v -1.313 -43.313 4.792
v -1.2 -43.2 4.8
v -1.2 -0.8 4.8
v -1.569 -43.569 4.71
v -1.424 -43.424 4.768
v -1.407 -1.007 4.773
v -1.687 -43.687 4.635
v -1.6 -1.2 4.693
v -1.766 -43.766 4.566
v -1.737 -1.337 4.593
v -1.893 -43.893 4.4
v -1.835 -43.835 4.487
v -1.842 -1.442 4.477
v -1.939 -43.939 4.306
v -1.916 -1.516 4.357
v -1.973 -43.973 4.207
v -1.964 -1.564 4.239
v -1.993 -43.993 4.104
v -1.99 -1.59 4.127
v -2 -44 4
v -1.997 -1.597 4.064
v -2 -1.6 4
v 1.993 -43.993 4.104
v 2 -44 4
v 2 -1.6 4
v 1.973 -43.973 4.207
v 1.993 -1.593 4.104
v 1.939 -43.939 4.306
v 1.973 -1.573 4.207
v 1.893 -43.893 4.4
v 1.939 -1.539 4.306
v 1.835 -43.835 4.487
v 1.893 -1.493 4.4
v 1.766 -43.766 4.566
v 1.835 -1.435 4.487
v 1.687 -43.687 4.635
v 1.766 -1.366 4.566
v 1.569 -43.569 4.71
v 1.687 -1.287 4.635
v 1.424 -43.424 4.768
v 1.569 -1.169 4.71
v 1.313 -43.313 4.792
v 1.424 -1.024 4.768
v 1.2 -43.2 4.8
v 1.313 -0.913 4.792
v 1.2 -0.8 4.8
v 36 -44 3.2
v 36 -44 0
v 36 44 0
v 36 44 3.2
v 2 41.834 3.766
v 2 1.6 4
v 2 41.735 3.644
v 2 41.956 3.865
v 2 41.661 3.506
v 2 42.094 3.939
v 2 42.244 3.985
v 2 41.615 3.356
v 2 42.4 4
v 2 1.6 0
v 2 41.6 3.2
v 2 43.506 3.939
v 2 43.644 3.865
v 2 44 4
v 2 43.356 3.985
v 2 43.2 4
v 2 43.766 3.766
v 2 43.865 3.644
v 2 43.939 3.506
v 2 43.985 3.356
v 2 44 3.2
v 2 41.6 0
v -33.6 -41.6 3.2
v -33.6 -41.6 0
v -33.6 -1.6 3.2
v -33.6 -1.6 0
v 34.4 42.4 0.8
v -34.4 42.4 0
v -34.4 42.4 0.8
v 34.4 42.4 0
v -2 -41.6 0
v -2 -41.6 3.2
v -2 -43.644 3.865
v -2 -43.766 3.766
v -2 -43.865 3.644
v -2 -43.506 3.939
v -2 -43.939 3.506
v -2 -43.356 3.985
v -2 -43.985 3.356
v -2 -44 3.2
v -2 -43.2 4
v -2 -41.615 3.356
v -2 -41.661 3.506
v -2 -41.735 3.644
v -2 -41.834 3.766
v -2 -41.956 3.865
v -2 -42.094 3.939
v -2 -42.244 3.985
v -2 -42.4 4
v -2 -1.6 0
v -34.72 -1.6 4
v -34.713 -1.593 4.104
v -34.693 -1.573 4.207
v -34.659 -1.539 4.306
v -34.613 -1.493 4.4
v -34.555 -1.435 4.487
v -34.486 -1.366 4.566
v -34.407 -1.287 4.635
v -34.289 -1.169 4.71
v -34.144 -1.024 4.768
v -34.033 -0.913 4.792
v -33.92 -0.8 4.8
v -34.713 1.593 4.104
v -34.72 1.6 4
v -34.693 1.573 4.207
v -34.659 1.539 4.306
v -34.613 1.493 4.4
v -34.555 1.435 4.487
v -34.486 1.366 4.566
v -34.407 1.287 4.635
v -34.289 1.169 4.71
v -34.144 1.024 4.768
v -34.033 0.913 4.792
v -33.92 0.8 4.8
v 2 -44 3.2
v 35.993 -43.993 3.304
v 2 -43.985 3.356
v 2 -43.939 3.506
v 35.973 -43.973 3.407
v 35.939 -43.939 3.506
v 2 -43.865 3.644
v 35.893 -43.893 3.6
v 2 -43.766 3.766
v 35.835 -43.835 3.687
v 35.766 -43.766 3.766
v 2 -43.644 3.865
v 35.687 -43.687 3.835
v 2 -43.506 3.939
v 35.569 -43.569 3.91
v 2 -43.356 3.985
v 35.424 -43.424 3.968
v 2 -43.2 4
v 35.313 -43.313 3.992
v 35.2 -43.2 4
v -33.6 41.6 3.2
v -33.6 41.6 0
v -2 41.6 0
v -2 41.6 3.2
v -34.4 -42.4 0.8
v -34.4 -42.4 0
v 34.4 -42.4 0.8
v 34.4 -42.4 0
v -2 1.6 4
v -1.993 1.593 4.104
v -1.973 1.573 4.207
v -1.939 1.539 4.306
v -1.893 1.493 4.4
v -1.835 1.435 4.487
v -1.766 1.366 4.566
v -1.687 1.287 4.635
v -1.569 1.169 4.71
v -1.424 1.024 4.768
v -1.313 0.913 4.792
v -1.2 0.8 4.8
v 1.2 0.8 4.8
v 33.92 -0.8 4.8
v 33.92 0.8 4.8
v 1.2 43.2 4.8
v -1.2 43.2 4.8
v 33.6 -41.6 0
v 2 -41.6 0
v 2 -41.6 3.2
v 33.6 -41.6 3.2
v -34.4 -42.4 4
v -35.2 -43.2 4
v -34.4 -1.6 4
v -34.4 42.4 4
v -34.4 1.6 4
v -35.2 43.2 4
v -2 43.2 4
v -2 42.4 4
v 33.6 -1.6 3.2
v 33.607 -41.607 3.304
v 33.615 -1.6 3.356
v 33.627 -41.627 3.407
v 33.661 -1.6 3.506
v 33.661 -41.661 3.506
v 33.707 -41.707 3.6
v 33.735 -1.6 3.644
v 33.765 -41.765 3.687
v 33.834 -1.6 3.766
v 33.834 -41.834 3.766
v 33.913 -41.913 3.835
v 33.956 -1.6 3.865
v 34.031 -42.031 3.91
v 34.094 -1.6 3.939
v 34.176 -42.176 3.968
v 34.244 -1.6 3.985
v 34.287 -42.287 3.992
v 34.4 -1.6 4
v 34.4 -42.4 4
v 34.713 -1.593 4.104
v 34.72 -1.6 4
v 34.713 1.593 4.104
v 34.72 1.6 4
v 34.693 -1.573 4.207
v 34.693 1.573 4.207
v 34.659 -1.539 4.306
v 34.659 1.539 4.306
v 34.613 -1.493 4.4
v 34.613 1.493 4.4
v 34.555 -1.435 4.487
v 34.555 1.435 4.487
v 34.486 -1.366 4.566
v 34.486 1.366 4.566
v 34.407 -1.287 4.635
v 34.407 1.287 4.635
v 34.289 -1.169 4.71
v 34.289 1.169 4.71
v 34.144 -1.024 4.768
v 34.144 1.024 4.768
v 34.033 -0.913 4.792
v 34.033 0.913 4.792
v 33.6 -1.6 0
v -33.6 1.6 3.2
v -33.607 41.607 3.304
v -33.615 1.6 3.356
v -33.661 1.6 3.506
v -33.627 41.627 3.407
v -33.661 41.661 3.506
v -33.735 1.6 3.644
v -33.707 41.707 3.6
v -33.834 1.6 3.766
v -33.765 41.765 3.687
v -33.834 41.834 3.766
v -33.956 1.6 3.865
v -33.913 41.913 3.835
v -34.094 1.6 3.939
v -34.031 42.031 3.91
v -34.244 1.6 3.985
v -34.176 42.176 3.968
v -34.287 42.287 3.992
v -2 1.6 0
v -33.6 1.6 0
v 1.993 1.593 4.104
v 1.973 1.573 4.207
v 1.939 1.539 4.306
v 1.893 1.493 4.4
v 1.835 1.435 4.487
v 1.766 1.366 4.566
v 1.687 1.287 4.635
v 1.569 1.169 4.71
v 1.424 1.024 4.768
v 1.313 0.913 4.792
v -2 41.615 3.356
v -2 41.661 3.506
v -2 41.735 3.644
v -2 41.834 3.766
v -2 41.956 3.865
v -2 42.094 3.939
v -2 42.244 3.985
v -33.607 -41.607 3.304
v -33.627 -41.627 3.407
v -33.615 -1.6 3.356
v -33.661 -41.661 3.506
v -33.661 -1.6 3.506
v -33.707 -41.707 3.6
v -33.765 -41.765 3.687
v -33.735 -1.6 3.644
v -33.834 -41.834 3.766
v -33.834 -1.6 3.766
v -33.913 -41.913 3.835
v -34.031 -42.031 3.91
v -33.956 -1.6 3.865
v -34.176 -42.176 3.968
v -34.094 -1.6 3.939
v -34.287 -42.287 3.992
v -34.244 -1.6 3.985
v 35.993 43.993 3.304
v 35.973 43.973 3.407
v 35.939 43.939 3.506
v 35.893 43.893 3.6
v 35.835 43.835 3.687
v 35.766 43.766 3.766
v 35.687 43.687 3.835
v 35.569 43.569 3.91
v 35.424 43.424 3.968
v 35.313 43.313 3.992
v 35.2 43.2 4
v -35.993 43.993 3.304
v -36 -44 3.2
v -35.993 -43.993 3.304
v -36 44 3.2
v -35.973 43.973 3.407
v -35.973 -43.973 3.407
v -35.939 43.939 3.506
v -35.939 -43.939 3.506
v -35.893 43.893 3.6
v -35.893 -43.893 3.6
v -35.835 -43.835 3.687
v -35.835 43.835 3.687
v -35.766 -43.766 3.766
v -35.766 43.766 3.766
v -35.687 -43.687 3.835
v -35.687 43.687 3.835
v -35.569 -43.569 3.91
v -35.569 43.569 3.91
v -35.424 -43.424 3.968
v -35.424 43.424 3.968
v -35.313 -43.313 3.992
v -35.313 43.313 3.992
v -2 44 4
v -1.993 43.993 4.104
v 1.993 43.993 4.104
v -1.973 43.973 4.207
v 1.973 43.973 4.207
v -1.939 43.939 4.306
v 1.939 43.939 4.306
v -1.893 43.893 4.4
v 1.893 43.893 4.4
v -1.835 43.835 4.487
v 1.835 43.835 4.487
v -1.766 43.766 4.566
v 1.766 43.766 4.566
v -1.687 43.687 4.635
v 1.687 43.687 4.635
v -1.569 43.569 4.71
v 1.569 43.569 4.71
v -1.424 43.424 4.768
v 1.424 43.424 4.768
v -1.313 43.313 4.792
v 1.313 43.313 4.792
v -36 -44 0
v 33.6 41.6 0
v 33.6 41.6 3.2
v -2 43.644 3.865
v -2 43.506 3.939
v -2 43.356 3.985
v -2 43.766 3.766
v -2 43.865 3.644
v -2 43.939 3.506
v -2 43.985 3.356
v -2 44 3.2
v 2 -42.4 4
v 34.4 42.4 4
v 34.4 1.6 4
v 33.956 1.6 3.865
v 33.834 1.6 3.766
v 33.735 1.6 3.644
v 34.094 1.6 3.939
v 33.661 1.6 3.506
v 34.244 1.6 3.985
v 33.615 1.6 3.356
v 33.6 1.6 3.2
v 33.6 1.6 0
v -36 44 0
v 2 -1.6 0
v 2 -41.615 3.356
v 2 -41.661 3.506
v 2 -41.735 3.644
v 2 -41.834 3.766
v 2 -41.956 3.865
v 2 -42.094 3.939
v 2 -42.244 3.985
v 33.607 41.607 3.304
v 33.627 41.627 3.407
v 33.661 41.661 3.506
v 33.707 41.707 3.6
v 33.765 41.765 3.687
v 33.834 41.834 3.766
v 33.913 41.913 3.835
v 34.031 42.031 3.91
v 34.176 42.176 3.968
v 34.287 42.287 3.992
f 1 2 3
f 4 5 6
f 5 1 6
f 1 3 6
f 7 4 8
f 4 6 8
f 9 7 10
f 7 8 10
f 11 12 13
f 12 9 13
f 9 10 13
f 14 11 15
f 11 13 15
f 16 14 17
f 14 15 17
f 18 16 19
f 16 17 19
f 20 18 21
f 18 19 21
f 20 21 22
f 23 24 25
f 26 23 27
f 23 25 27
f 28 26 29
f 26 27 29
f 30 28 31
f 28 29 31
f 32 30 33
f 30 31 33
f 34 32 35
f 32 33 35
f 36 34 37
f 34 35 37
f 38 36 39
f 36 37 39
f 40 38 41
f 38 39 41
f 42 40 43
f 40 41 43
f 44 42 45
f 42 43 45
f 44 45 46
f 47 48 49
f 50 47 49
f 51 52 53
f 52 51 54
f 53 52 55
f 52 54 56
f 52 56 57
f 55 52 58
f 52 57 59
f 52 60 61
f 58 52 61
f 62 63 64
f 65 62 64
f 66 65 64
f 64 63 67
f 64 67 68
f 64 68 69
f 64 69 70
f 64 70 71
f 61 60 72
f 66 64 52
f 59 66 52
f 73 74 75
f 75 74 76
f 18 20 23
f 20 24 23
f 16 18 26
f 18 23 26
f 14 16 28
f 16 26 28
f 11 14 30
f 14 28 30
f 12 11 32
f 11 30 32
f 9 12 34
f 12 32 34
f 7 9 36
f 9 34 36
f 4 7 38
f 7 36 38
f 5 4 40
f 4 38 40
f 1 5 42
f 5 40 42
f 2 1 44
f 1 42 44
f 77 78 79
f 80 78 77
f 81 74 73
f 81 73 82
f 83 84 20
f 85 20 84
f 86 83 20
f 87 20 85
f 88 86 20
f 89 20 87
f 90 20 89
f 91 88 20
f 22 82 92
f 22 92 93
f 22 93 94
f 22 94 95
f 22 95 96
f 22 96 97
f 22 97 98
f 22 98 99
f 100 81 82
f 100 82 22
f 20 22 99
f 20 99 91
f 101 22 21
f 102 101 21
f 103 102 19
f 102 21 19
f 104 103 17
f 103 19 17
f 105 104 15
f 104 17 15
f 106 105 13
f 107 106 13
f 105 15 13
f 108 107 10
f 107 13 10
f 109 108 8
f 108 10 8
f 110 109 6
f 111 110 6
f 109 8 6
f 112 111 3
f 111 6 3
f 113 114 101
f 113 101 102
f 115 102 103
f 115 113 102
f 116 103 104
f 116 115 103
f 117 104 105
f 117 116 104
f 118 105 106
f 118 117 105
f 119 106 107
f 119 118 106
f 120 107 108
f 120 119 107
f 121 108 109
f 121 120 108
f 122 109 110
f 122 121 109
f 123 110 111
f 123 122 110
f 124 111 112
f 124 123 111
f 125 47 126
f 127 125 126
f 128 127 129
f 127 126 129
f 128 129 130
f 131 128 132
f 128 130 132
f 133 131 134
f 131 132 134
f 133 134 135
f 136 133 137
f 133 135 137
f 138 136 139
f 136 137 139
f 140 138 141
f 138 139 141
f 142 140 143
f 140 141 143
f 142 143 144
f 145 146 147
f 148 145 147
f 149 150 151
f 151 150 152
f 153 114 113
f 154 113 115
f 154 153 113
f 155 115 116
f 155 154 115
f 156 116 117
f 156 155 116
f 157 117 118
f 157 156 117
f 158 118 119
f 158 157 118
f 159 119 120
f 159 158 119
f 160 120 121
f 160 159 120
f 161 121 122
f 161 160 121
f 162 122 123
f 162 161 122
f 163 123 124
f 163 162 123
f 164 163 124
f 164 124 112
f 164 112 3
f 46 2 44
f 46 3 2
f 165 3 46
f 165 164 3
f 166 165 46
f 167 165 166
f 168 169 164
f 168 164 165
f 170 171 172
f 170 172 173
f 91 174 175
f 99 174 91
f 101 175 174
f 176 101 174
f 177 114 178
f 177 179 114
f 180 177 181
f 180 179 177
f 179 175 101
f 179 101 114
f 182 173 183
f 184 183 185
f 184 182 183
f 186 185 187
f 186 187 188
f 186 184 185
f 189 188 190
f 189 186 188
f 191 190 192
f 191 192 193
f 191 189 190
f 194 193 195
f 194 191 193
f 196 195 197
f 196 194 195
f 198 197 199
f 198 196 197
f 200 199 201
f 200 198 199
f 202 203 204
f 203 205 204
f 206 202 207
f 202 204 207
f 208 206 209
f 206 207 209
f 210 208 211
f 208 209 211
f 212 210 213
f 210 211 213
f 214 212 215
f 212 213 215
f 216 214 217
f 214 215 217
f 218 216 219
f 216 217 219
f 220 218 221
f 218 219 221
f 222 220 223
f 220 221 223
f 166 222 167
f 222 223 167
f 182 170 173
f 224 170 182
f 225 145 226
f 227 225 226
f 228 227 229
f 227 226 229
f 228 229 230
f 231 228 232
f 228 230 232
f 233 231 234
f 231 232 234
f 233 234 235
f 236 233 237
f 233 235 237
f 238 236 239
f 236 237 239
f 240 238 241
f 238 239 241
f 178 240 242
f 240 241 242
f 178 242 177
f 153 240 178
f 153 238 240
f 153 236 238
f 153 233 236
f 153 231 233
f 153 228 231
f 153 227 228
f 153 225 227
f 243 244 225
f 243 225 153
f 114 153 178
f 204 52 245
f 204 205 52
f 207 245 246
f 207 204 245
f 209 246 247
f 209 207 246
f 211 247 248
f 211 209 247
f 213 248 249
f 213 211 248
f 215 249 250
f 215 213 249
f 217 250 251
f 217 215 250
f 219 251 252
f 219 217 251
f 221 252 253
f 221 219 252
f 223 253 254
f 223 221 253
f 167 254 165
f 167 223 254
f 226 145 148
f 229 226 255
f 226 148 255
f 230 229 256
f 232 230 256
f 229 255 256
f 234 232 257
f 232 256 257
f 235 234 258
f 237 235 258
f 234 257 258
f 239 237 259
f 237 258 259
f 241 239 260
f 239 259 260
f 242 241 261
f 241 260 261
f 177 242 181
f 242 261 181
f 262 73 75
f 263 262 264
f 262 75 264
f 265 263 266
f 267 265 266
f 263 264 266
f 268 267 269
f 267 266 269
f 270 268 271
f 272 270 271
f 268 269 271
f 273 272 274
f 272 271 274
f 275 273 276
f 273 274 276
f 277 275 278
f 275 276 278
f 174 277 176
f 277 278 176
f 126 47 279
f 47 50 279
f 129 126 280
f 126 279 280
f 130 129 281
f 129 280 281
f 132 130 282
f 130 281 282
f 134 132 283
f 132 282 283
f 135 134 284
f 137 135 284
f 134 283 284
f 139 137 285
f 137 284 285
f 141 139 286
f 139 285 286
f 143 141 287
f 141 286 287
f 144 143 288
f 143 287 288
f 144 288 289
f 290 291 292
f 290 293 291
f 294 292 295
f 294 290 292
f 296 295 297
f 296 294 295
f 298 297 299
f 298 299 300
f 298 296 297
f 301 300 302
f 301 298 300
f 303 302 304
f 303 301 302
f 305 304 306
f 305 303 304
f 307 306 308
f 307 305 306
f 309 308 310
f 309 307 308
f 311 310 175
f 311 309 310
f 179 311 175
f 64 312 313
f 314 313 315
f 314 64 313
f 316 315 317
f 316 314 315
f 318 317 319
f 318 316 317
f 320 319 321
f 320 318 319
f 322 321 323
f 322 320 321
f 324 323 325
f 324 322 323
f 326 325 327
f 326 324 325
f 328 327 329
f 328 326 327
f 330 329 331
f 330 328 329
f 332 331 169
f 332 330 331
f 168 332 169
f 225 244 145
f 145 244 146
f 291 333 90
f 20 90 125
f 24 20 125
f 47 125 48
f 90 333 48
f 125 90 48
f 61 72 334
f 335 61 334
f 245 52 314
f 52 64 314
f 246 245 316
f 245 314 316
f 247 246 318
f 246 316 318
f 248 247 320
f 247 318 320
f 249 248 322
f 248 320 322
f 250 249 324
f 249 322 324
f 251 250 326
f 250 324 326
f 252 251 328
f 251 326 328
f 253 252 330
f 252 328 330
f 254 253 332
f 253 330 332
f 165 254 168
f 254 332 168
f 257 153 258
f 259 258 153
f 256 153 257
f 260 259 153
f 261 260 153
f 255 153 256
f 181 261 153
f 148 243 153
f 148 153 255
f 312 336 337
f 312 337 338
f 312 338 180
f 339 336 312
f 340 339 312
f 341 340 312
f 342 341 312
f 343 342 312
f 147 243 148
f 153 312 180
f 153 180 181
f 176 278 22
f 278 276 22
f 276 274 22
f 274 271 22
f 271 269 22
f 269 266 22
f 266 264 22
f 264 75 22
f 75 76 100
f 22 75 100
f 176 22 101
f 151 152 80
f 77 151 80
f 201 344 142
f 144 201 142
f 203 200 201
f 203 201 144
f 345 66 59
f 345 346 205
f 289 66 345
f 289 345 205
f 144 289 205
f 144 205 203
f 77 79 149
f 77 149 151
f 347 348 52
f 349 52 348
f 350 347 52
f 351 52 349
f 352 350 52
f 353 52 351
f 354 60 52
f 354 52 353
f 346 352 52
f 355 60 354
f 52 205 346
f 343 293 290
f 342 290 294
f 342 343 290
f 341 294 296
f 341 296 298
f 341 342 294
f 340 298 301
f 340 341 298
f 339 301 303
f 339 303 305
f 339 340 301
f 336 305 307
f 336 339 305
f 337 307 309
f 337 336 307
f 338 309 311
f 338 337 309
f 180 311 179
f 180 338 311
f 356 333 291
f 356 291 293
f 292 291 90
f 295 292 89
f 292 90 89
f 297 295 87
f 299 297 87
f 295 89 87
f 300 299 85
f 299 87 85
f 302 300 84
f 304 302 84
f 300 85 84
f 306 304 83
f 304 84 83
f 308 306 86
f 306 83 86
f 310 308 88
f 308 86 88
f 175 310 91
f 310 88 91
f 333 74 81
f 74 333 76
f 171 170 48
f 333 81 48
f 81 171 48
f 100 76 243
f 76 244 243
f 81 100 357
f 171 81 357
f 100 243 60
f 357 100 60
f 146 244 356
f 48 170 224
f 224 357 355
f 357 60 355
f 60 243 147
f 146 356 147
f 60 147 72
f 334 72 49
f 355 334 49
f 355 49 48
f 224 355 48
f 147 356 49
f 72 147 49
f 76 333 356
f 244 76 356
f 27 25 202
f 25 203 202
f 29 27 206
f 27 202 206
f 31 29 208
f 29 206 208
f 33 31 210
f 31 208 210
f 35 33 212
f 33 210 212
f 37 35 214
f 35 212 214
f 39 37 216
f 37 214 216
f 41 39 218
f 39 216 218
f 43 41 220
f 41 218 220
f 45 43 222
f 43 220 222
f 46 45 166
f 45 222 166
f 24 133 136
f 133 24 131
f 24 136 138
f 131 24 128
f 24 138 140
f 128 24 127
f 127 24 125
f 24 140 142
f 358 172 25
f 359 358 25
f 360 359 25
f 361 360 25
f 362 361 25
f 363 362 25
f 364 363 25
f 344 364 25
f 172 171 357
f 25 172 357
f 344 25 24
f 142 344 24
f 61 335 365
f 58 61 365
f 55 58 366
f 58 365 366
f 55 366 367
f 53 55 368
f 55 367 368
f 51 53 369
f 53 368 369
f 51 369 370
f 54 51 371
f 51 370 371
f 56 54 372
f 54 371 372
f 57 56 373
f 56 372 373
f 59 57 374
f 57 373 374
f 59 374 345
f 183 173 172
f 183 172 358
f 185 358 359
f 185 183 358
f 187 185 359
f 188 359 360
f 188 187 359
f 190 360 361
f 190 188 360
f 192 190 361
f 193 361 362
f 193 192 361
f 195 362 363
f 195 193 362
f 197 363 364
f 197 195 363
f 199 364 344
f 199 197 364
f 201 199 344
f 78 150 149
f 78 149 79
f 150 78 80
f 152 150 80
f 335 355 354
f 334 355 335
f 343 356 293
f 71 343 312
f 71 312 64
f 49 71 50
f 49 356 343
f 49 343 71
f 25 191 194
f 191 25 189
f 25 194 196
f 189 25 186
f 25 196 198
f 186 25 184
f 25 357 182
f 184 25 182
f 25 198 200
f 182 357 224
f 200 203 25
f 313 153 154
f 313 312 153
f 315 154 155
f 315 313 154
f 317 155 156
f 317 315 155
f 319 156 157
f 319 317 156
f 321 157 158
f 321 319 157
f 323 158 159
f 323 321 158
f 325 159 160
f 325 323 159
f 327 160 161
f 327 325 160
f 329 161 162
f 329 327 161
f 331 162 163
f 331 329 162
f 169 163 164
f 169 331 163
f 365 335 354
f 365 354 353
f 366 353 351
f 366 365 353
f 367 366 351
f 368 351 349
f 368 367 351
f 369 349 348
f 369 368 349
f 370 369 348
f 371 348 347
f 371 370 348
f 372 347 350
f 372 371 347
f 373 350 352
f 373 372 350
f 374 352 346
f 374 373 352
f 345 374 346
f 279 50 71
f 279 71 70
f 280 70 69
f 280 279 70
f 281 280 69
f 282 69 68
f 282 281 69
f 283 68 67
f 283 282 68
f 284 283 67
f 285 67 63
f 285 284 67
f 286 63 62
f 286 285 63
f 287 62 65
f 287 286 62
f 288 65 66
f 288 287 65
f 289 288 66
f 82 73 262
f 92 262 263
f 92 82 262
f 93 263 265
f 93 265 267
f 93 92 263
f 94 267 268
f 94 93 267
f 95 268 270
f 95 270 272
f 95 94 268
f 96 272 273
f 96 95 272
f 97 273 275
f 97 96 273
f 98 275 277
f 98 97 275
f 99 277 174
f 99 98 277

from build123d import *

# Parameters (mm, degrees)
SKETCH1_W           = 900
SKETCH1_H           = 1100
SKETCH1_W_2         = 840
SKETCH1_H_2         = 1040
BOSS_EXTRUDE1_DEPTH = 50
FILLET1_R           = 10
SKETCH2_W           = 50
SKETCH2_H           = 1100
SKETCH2_W_2         = 868
SKETCH2_H_2         = 40
BOSS_EXTRUDE2_DEPTH = 60
FILLET2_R           = 10
SKETCH3_W           = 860
SKETCH3_H           = 1060
BOSS_EXTRUDE3_DEPTH = 10
SCALE2_SCALE        = 0.25
SCALE3_SCALE        = 0.32


with BuildPart() as part:
    # Sketch1 → Boss-Extrude1 (new body)
    with BuildSketch(Plane.XY):
        Rectangle(SKETCH1_W, SKETCH1_H)
        Rectangle(SKETCH1_W_2, SKETCH1_H_2, mode=Mode.SUBTRACT)
    extrude(amount=BOSS_EXTRUDE1_DEPTH)

    # Fillet1
    fillet1_edges = [part.edges().sort_by_distance(p)[0] for p in [
        (-450, 0, 50),
        (0, -550, 50),
        (0, -520, 50),
        (420, 0, 50),
        (0, 520, 50),
        (-420, 0, 50),
        (450, 0, 50),
        (0, 550, 50),
    ]]
    fillet(fillet1_edges, radius=FILLET1_R)

    # Sketch2 → Boss-Extrude2 (add)
    with BuildSketch(Plane.XY):
        Rectangle(SKETCH2_W, SKETCH2_H)
        Rectangle(SKETCH2_W_2, SKETCH2_H_2)
    extrude(amount=BOSS_EXTRUDE2_DEPTH)

    # Fillet2
    fillet2_edges = [part.edges().sort_by_distance(p)[0] for p in [
        (0, -550, 60),
        (-25, -285, 60),
        (-229.5, -20, 60),
        (-434, 0, 60),
        (-229.5, 20, 60),
        (-25, 285, 60),
        (0, 550, 60),
        (25, 285, 60),
        (229.5, 20, 60),
        (434, 0, 60),
        (229.5, -20, 60),
        (25, -285, 60),
    ]]
    fillet(fillet2_edges, radius=FILLET2_R - 0.0001)  # a hair under: the kernel refuses the full size


with BuildPart() as body_2:
    # Sketch3 → Boss-Extrude3 (new body)
    with BuildSketch(Plane.XY):
        Rectangle(SKETCH3_W, SKETCH3_H)
    extrude(amount=BOSS_EXTRUDE3_DEPTH)


with BuildPart() as part_1:
    # Scale2: scaled about (0, 0, 0)
    add(part.part.scale(SCALE2_SCALE))


with BuildPart() as body_2_1:
    # Scale2: scaled about (0, 0, 0)
    add(body_2.part.scale(SCALE2_SCALE))


with BuildPart() as part_2:
    # Scale3: scaled about (0, 0, 0)
    add(part_1.part.scale(SCALE3_SCALE))


with BuildPart() as body_2_2:
    # Scale3: scaled about (0, 0, 0)
    add(body_2_1.part.scale(SCALE3_SCALE))


solid = Compound([part_2.part, body_2_2.part])
